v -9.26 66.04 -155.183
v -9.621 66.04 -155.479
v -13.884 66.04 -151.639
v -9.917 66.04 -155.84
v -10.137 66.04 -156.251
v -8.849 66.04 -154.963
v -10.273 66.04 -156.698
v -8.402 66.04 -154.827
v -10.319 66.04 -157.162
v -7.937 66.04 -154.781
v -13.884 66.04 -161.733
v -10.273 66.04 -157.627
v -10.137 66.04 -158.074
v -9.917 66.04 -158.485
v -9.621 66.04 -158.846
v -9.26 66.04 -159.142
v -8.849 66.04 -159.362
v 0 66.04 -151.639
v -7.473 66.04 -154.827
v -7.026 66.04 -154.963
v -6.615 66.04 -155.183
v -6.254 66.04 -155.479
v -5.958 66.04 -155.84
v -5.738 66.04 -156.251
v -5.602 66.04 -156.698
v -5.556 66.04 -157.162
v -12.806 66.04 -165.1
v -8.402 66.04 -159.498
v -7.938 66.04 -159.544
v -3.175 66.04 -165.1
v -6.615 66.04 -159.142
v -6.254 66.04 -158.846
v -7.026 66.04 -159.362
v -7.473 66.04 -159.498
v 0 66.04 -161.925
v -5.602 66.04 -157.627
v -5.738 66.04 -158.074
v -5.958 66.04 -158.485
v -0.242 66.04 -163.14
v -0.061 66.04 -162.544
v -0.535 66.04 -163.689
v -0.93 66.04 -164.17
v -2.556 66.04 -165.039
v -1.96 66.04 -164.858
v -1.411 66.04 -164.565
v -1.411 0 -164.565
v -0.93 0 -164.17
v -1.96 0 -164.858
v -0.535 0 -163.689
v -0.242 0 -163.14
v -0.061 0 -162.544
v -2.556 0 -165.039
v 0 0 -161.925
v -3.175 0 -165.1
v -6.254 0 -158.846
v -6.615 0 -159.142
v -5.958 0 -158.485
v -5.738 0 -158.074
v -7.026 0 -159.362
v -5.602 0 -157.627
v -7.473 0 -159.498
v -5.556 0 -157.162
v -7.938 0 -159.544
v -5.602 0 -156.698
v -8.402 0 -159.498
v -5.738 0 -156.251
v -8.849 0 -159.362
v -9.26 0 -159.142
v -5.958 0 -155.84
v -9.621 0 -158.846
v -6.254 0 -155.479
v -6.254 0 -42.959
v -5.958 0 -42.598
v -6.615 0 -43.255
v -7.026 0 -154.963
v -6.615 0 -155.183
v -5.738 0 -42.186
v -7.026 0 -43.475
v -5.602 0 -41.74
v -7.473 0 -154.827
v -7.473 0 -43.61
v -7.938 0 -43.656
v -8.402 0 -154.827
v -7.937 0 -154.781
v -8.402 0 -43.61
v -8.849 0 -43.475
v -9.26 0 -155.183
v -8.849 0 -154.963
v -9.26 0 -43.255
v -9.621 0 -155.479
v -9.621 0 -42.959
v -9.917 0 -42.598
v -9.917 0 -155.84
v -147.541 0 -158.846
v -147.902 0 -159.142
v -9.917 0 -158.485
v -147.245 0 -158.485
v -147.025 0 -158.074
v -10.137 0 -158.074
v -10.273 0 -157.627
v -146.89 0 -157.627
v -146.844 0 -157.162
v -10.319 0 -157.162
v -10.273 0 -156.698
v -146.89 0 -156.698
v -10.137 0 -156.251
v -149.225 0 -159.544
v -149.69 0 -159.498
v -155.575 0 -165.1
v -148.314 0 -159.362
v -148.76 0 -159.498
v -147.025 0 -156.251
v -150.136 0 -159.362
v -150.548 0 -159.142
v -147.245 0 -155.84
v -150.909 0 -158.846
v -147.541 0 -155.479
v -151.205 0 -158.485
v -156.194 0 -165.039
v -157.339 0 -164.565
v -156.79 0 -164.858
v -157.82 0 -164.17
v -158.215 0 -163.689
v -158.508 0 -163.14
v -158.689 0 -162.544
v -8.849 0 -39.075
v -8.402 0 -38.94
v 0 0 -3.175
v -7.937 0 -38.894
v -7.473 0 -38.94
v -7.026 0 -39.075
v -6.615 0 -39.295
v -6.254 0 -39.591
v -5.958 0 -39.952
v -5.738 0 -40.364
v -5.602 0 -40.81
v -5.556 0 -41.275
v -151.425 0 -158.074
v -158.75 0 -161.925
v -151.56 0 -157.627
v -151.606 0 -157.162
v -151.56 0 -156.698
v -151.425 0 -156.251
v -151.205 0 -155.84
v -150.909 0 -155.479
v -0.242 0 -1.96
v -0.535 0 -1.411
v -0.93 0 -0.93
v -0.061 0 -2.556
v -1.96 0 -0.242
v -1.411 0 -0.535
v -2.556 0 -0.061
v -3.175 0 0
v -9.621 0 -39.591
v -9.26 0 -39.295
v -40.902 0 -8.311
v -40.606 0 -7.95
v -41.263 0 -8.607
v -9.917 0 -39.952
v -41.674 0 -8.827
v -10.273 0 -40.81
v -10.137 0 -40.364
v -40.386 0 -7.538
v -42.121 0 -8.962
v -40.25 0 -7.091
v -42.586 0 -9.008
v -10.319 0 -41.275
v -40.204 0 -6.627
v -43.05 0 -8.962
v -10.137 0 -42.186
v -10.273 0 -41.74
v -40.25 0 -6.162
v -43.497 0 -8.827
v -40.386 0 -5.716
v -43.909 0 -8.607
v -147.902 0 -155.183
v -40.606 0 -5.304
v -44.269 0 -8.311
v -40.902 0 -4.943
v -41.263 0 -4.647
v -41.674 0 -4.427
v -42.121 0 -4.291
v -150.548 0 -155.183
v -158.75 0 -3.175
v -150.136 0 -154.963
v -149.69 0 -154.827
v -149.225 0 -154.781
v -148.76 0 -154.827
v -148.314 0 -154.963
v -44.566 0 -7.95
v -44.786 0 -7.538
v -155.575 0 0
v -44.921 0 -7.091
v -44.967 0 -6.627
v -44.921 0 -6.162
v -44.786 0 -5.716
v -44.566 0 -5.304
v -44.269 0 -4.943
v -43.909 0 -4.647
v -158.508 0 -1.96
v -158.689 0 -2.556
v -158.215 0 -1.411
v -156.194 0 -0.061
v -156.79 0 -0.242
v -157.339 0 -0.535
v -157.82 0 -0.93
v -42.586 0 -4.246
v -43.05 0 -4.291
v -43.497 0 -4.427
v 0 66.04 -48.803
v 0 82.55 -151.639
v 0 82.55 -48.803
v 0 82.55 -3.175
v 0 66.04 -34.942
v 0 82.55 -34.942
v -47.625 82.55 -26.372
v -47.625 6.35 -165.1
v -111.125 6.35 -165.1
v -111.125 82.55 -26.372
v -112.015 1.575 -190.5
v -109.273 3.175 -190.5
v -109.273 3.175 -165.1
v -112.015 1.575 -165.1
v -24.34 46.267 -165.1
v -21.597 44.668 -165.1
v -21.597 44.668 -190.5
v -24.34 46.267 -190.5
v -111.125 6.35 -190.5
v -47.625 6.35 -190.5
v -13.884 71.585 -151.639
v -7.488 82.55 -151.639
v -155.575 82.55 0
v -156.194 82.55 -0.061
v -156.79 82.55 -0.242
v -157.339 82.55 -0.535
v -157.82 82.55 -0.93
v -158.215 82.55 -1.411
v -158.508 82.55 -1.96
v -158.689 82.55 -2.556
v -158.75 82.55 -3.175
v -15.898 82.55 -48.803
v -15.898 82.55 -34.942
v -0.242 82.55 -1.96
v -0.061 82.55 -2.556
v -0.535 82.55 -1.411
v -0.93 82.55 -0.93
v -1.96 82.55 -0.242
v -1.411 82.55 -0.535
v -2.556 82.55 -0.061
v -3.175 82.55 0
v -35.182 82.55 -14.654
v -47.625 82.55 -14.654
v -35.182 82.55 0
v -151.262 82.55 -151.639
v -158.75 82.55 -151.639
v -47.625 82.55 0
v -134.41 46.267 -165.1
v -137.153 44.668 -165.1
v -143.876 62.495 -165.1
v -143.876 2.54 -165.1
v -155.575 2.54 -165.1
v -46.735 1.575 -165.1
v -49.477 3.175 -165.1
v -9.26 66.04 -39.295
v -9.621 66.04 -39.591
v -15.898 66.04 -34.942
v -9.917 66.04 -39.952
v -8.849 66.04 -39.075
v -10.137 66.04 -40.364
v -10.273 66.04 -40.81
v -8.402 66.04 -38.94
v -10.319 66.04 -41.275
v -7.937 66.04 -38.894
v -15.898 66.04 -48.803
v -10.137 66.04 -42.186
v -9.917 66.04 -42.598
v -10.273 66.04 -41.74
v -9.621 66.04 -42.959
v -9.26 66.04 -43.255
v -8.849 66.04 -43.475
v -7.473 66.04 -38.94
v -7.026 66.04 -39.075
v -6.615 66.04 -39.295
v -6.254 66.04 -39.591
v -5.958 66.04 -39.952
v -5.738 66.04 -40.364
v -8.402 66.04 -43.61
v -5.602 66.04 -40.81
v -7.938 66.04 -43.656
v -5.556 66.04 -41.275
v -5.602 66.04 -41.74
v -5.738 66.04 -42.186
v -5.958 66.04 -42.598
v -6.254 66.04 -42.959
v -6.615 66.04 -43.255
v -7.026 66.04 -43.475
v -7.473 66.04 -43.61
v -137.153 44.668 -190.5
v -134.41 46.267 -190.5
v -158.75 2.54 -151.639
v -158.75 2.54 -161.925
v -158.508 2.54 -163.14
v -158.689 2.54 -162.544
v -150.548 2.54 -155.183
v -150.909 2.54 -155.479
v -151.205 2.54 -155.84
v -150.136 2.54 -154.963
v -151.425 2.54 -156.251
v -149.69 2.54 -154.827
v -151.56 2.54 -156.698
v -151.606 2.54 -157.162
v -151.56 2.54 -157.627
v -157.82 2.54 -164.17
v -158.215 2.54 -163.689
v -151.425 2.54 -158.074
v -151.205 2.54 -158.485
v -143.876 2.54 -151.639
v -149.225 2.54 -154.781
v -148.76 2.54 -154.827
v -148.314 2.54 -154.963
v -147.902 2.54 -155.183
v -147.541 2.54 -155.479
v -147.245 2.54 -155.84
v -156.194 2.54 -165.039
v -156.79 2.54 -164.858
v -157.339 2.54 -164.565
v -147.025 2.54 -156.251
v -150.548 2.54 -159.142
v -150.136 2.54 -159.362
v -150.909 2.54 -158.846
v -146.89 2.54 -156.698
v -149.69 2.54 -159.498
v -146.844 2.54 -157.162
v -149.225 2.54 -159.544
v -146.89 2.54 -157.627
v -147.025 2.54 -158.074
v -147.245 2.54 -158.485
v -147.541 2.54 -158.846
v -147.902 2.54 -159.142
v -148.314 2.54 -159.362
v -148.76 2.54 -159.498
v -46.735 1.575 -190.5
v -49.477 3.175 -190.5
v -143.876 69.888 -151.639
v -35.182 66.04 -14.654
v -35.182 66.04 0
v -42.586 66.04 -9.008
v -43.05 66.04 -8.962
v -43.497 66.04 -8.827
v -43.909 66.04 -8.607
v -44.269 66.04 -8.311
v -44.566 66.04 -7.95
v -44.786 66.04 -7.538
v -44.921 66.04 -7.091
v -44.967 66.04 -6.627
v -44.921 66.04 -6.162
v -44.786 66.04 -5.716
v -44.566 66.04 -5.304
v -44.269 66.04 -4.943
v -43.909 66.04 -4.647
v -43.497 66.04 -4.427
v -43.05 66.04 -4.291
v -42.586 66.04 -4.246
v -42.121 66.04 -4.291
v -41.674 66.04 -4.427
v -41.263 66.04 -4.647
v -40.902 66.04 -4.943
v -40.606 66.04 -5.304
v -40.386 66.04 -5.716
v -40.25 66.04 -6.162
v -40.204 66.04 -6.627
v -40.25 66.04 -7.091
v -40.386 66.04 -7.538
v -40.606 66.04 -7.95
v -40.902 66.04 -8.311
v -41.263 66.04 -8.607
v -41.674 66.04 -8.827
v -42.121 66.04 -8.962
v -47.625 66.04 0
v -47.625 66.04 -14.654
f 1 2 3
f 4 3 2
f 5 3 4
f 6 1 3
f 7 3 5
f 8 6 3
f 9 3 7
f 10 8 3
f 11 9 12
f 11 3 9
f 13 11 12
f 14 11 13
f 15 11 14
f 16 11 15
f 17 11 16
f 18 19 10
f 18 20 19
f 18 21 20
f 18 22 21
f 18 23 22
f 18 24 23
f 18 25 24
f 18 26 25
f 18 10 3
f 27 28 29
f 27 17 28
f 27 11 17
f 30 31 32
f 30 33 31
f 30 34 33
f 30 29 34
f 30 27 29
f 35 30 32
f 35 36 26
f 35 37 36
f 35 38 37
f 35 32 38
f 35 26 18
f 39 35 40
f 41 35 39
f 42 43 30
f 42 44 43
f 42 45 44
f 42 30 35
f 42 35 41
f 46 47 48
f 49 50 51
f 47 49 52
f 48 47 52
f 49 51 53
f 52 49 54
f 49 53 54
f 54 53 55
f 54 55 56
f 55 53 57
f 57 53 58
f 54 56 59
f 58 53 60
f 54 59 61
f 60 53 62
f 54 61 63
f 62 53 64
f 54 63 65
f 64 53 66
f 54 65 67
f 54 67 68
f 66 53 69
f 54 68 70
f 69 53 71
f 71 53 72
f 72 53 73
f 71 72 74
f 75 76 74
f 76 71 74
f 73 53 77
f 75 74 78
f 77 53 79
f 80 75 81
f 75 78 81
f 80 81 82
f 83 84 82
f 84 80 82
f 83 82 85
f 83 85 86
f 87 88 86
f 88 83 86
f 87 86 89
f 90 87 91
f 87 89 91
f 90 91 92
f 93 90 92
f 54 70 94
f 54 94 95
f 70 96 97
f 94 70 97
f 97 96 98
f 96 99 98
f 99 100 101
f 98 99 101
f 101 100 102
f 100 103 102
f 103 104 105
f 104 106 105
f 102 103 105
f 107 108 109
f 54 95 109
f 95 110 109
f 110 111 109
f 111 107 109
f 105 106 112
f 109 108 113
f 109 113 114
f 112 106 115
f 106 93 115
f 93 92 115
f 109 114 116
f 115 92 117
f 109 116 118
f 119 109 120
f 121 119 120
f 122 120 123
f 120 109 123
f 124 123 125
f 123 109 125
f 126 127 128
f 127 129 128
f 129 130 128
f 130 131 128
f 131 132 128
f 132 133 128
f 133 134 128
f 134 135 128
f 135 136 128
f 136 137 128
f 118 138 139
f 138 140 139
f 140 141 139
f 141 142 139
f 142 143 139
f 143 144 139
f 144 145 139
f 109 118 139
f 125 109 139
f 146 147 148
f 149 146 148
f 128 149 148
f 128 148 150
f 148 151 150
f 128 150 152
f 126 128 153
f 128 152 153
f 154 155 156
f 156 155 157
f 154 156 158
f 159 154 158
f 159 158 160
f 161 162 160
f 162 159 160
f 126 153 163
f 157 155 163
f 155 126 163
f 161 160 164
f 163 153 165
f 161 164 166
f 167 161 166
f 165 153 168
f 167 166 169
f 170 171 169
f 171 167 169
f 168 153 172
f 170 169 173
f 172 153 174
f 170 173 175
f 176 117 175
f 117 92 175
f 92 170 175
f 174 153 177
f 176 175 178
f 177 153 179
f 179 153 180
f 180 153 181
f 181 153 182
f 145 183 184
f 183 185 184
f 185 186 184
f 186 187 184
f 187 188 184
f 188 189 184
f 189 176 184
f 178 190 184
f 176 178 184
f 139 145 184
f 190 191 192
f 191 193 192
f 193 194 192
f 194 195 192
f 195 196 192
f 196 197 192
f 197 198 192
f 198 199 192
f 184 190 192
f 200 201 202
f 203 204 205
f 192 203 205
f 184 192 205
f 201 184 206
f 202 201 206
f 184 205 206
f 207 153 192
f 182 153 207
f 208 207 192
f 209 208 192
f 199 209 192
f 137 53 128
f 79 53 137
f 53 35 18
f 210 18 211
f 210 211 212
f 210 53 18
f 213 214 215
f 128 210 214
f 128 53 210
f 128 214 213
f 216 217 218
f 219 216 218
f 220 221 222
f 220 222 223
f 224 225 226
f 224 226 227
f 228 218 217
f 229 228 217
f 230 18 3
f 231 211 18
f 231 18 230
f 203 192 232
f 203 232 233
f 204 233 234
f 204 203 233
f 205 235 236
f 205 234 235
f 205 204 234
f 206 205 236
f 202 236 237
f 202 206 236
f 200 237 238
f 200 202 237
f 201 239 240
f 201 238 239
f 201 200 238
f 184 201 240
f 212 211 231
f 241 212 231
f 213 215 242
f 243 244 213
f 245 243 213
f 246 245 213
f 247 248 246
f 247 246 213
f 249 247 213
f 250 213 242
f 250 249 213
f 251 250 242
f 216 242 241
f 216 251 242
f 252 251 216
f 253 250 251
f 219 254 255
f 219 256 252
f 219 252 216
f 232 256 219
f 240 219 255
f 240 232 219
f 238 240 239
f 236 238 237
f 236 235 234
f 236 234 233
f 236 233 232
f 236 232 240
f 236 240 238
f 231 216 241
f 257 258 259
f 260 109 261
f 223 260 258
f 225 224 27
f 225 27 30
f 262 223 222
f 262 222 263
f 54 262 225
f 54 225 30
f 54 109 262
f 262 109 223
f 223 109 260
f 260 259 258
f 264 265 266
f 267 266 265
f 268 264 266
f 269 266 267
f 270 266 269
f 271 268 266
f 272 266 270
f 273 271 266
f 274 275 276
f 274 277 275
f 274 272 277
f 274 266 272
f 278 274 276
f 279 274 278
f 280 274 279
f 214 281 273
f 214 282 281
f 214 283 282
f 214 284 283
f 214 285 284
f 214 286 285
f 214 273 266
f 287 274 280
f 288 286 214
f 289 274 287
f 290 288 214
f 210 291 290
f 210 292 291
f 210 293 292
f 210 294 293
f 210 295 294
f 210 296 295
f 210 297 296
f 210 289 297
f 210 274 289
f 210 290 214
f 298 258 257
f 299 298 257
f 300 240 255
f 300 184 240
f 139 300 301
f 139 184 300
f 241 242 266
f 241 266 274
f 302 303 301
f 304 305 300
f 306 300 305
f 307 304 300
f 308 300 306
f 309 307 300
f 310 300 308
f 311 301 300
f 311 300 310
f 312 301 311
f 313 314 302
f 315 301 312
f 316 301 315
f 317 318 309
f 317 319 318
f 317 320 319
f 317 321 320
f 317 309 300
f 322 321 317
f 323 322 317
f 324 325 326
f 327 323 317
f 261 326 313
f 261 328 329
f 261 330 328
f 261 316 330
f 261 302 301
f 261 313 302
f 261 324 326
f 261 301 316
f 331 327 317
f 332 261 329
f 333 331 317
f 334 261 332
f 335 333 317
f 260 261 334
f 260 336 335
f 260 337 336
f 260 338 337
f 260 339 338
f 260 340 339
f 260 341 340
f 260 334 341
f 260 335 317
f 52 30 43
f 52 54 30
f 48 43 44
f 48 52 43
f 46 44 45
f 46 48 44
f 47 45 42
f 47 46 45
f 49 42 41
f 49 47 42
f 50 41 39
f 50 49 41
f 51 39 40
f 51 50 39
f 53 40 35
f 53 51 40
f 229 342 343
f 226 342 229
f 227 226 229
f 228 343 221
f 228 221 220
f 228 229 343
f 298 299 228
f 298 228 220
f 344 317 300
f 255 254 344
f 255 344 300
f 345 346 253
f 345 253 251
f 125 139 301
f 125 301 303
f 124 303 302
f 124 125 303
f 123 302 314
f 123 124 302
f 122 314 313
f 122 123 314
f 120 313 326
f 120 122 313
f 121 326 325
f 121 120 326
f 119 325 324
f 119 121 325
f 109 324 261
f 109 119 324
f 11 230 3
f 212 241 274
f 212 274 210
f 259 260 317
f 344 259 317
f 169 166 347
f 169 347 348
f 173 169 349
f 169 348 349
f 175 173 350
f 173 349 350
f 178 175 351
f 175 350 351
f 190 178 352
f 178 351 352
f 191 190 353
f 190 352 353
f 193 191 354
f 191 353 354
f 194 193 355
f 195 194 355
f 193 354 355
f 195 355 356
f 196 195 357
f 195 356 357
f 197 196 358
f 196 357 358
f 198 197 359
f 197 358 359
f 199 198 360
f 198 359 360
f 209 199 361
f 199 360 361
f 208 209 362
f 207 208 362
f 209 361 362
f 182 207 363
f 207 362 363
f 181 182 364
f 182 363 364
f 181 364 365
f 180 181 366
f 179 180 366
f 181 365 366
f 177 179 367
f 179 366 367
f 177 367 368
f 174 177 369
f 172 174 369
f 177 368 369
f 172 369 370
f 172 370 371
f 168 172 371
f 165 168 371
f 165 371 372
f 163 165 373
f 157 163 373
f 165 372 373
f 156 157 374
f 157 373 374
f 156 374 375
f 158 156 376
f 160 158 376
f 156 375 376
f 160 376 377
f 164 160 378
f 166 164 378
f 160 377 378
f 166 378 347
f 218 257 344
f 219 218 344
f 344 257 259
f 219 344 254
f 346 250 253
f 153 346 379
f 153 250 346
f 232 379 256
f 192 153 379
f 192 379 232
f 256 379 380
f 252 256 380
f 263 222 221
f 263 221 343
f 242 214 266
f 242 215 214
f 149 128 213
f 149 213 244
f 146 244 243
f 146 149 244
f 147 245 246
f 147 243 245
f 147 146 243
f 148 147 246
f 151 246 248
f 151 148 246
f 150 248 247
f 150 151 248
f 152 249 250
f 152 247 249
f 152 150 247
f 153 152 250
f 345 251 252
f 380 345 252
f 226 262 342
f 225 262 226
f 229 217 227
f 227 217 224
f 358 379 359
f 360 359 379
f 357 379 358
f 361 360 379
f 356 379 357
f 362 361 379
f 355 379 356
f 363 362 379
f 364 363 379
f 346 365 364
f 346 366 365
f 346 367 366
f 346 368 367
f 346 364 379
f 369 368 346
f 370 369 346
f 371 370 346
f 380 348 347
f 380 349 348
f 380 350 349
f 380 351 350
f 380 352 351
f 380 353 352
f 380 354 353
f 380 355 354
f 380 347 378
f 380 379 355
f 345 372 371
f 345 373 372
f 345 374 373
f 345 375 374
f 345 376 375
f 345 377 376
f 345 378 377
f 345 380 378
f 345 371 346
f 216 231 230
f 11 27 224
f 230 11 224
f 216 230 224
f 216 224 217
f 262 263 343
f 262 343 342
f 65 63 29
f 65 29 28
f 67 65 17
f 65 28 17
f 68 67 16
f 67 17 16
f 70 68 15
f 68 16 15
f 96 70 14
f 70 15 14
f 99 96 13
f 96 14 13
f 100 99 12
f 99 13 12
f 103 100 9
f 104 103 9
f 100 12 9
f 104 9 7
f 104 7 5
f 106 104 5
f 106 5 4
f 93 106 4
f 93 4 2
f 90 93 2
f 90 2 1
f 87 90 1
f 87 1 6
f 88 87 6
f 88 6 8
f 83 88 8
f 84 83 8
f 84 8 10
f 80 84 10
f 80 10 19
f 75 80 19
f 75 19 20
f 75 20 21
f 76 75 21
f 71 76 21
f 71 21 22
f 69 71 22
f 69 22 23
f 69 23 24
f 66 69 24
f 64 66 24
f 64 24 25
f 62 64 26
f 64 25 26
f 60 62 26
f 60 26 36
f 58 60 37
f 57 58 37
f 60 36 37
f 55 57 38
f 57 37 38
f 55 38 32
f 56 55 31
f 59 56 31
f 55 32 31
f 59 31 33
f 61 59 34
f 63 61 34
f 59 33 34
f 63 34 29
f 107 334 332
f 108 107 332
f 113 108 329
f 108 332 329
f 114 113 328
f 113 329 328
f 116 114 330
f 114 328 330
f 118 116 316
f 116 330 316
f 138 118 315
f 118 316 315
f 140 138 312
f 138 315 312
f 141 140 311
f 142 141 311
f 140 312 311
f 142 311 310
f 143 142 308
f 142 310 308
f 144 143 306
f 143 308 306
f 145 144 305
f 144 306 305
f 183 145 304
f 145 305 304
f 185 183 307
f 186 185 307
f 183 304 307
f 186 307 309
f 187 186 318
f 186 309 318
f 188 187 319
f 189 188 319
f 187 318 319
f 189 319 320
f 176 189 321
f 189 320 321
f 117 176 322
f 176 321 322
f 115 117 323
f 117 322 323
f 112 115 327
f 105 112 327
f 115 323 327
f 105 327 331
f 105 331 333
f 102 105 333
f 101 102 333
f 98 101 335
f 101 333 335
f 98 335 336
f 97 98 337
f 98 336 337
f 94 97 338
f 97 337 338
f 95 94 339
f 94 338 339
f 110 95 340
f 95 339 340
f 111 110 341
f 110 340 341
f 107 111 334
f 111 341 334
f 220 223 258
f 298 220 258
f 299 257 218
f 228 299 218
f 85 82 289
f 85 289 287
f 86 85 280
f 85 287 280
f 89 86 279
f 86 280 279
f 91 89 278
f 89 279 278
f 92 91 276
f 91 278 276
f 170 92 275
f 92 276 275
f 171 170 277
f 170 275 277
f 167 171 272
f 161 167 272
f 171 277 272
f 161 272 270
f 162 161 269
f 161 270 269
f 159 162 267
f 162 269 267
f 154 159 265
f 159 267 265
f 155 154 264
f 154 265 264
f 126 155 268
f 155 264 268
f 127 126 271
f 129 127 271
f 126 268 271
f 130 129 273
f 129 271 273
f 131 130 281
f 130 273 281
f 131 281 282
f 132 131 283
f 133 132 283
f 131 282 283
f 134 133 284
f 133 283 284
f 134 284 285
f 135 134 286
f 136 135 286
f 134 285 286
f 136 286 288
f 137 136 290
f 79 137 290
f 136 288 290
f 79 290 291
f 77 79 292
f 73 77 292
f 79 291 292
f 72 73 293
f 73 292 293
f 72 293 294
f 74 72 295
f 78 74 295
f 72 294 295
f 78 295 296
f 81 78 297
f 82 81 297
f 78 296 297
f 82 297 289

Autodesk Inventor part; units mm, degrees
ref_plane "YZ Plane" through (0, 0, 0) normal (1, 0, 0) x (0, 1, 0)
ref_plane "XZ Plane" through (0, 0, 0) normal (0, 1, 0) x (-1, 0, 0)
ref_plane "XY Plane" through (0, 0, 0) normal (0, 0, 1) x (1, 0, 0)
sketch "Sketch1" plane through (0, 0, 0) normal (0, 1, 0) x (-1, 0, 0)
  line L0 (3.175, 0) -> (155.575, 0)
  line L1 (158.75, -3.175) -> (158.75, -161.925)
  line L2 (155.575, -165.1) -> (3.175, -165.1)
  line L3 (0, -161.925) -> (0, -3.175)
  arc A0 (158.75, -3.175) -> (155.575, 0) centre (155.575, -3.175) ccw
  arc A1 (155.575, -165.1) -> (158.75, -161.925) centre (155.575, -161.925) ccw
  arc A2 (0, -161.925) -> (3.175, -165.1) centre (3.175, -161.925) ccw
  arc A3 (3.175, 0) -> (0, -3.175) centre (3.175, -3.175) ccw
  point P0 (0, 0)
  point P1 (158.75, -165.1)
  point P2 (158.75, 0)
  point P3 (0, -165.1)
  dimension "d0" = 158.75
  dimension "d1" = 165.1
  dimension "d2" = 3.175
  dimension "d3" = 3.175
  dimension "d4" = 3.175
  dimension "d5" = 3.175
extrude "Extrusion1" add sketch "Sketch1" along normal blind 82.55
sketch "Sketch2" plane through (0, 0, 0) normal (0, -1, 0) x (1, 0, 0)
  line L0 (-3.175, -165.1) -> (-155.575, -165.1) projected
  line L1 (-6.5142, -165.1) -> (0, -165.1)
  line L2 (0, -158.9917) -> (0, -165.1)
  line L3 (0, -165.1) -> (-7.9375, -165.1)
  line L4 (-7.9375, -165.1) -> (-7.9375, -157.1625)
  line L5 (-7.9375, -157.1625) -> (0, -157.1625)
  line L6 (0, -157.1625) -> (0, -165.1)
  line L7 (-7.9375, -157.1625) -> (-149.225, -157.1625)
  line L8 (-7.9375, -157.1625) -> (-7.9375, -41.275)
  line L9 (-7.9375, -41.275) -> (-42.5857, -6.6268)
  line L10 (-7.9375, -41.275) -> (41.0625, -41.275) construction
  point P0 (0, 0)
  dimension "d8" = 7.9375
  dimension "d9" = 7.9375
  dimension "d10" = 141.2875
  dimension "d11" = 115.8875
  dimension "d12" = 49
  dimension "d13" = 135
hole "Hole1" at (-42.5857, 0, -6.6268) at (-7.9375, 0, -41.275) at (-7.9375, 0, -157.1625) at (-149.225, 0, -157.1625) direction (0, 1, 0) diameter 4.7625 end through all
sketch "Sketch7" plane through (-3.175, 0, -165.1) normal (0, 0, -1) x (-1, 0, 0)
  line L0 (0, 0) -> (0, 82.55) projected
  line L1 (0, 82.55) -> (44.45, 82.55)
  line L2 (152.4, 82.55) -> (0, 82.55) projected
  line L3 (0, 82.55) -> (44.45, 82.55) construction
  line L4 (44.45, 82.55) -> (107.95, 82.55)
  line L5 (107.95, 82.55) -> (107.95, 6.35)
  line L6 (107.95, 6.35) -> (44.45, 6.35)
  line L7 (44.45, 6.35) -> (44.45, 82.55)
  line L8 (44.45, 6.35) -> (0, 82.55)
  line L9 (107.95, 6.35) -> (152.4, 82.55)
  line L10 (107.95, 82.55) -> (152.4, 82.55)
  point P0 (-3.175, 0)
  dimension "d22" = 44.45
  dimension "d23" = 0
  dimension "d24" = 63.5
  dimension "d25" = 76.2
sketch "Sketch8" plane through (0, 0, -3.175) normal (1, 0, 0) x (0, 0, -1)
  line L0 (0, 82.55) -> (-3.175, 82.55) projected
  line L1 (0, 82.55) -> (158.75, 82.55) projected
  line L2 (23.1966, 82.55) -> (161.925, 6.35)
  line L3 (161.925, 0) -> (161.925, 82.55) projected
  point P0 (-3.175, 0)
sweep "Sweep1" cut profiles "Sketch7" path "Sketch8" path curves L2
sketch "Sketch9" plane through (0, 82.55, 0) normal (0, 1, 0) x (1, 0, 0)
  line L0 (-3.175, 165.1) -> (-155.575, 165.1) projected
  line L1 (0, 3.175) -> (0, 161.925) projected
  line L2 (-13.8845, 165.1) -> (0, 165.1)
  line L3 (0, 165.1) -> (0, 151.6388)
  line L4 (0, 151.6388) -> (-13.8845, 151.6388)
  line L5 (-13.8845, 151.6388) -> (-13.8845, 165.1)
  line L6 (-143.876, 151.6388) -> (-158.75, 151.6388)
  line L7 (-158.75, 151.6388) -> (-158.75, 165.1)
  line L8 (-158.75, 165.1) -> (-143.876, 165.1)
  line L9 (-143.876, 165.1) -> (-143.876, 151.6388)
  line L10 (0, 3.175) -> (0, 161.925) projected
  line L11 (-15.8979, 48.8027) -> (0, 48.8027)
  line L12 (0, 48.8027) -> (0, 34.9422)
  line L13 (0, 34.9422) -> (-15.8979, 34.9422)
  line L14 (-15.8979, 34.9422) -> (-15.8979, 48.8027)
  line L15 (-47.625, 0) -> (-47.625, 165.1) projected
  line L16 (-35.1821, 14.6536) -> (-47.625, 14.6536)
  line L17 (-47.625, 14.6536) -> (-47.625, 0)
  line L18 (-47.625, 0) -> (-35.1821, 0)
  line L19 (-35.1821, 0) -> (-35.1821, 14.6536)
  point P0 (0, 0)
  point P1 (0, 48.8027)
extrude "Extrusion2" cut sketch "Sketch9" against normal blind 16.51 contours L2 L3 L1 L4 L5 L0 | L1 L13 L14 L11 | L16 L19 L18 L15
extrude "Extrusion3" cut sketch "Sketch9" against normal blind 80.01 contours L9 L6 L7 L8 L0
sketch "Sketch11" plane through (-3.175, 0, -165.1) normal (0, 0, -1) x (-1, 0, 0)
  line L0 (44.45, 82.55) -> (44.45, 6.35) projected
  line L1 (107.95, 6.35) -> (44.45, 6.35) projected
  line L2 (44.45, 6.35) -> (107.95, 6.35)
  line L3 (107.95, 6.35) -> (107.95, 3.175)
  line L4 (107.95, 3.175) -> (44.45, 3.175)
  line L5 (44.45, 3.175) -> (44.45, 6.35)
  line L6 (44.45, 6.35) -> (9.6308, 66.04) projected
  line L7 (21.1649, 46.2673) -> (46.3021, 3.175)
  line L8 (46.3021, 3.175) -> (43.5596, 1.5752)
  line L9 (43.5596, 1.5752) -> (18.4224, 44.6675)
  line L10 (18.4224, 44.6675) -> (21.1649, 46.2673)
  line L11 (140.701, 62.4945) -> (107.95, 6.35) projected
  line L12 (131.2351, 46.2673) -> (106.0979, 3.175)
  line L13 (106.0979, 3.175) -> (108.8404, 1.5752)
  line L14 (108.8404, 1.5752) -> (133.9776, 44.6675)
  line L15 (133.9776, 44.6675) -> (131.2351, 46.2673)
  point P0 (-3.175, 0)
  dimension "d40" = 3.175
  dimension "d41" = 3.175
  dimension "d42" = 3.175
extrude "Extrusion5" add sketch "Sketch11" along normal blind 25.4
properties part number "pipet tip trough"
